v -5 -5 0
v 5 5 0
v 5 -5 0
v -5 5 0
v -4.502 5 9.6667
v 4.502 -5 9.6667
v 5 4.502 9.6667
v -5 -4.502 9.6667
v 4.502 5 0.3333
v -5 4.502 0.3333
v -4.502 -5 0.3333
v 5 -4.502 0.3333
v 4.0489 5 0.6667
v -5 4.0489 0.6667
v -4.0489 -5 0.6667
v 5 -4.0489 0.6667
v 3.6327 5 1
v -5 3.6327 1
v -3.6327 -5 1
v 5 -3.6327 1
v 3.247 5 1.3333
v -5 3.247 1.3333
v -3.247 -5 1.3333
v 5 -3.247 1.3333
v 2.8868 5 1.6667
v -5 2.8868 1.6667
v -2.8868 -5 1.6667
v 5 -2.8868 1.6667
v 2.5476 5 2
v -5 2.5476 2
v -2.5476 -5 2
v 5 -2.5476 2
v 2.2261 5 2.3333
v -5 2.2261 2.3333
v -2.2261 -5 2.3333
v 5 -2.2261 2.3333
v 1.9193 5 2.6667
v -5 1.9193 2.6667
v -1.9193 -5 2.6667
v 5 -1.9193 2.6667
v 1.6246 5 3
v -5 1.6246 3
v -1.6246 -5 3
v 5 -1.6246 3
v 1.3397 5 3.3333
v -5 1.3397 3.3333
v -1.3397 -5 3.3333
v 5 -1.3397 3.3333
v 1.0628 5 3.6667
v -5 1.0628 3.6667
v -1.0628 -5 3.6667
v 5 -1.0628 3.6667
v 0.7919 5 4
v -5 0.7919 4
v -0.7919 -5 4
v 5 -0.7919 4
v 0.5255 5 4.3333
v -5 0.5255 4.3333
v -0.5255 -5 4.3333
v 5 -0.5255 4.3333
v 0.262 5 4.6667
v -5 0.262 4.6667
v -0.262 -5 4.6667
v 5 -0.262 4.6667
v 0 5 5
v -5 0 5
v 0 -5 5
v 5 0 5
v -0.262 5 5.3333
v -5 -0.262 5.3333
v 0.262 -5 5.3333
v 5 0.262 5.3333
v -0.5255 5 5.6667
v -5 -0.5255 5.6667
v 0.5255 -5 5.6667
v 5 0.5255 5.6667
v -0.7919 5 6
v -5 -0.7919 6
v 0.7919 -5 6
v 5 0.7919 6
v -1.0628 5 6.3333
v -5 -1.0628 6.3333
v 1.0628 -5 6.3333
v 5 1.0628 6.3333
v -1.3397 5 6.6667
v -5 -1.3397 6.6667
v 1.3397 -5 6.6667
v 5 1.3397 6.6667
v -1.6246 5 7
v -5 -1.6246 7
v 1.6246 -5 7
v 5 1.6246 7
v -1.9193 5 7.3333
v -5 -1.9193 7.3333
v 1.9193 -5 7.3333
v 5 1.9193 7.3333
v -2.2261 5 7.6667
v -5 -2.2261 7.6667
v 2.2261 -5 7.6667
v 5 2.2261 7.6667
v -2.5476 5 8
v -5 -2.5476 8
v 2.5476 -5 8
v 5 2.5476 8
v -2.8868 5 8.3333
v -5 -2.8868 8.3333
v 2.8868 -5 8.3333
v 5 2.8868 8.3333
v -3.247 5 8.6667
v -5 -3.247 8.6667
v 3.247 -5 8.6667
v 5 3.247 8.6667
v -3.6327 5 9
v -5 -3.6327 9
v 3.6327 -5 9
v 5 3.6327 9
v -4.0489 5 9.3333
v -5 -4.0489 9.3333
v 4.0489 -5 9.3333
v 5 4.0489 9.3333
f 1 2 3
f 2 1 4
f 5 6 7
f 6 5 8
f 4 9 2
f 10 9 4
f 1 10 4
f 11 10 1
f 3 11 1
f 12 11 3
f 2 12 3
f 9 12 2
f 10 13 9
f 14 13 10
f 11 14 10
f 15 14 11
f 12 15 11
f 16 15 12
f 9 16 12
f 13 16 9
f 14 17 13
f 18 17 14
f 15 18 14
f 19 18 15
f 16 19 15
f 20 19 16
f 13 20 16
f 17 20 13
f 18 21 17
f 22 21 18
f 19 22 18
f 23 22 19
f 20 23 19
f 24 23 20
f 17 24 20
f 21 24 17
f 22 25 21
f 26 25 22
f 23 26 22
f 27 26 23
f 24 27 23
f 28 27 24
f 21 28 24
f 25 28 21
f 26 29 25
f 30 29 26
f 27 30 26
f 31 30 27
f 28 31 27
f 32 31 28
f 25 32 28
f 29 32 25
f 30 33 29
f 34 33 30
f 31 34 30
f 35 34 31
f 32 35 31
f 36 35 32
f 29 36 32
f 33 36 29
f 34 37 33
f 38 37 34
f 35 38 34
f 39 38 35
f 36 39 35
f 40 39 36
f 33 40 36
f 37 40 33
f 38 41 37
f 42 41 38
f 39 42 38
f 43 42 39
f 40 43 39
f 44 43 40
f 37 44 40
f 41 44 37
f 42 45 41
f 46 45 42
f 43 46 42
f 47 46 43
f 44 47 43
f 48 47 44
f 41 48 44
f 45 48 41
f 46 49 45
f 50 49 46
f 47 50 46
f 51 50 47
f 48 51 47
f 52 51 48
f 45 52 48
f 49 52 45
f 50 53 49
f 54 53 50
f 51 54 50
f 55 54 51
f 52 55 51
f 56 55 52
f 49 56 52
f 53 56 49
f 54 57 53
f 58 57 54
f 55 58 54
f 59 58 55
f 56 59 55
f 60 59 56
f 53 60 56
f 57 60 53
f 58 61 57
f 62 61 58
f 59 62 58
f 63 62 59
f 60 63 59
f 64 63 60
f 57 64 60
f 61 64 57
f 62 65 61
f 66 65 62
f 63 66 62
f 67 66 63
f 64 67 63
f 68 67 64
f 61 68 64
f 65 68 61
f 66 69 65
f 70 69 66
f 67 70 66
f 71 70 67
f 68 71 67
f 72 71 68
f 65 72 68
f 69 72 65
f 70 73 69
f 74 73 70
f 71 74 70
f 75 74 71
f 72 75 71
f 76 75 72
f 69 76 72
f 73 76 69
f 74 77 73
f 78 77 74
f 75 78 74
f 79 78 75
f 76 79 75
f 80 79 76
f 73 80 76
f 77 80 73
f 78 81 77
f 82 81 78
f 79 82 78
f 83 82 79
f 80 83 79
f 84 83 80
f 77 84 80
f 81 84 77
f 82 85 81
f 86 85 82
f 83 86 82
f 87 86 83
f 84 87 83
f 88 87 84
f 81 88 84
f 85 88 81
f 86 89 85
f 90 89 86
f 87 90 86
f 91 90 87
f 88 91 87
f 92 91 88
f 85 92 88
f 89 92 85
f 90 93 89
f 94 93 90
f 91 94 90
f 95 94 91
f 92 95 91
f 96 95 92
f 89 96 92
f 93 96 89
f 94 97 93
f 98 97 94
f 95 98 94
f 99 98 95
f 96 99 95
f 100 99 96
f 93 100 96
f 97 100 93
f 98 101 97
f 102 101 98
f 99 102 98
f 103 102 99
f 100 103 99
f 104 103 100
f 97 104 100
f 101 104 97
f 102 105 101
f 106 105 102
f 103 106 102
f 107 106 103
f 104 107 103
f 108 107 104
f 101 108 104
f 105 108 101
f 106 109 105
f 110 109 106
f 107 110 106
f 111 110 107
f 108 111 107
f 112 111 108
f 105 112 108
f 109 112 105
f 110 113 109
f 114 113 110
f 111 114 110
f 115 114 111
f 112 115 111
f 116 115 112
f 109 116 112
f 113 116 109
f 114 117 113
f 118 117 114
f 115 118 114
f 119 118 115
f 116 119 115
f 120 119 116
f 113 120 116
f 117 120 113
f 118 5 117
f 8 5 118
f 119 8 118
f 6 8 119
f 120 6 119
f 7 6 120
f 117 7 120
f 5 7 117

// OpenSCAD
// file: quickthread.scad
function _numSections(numTurns) = 1+numTurns*$fn;

extrusionNudge = 0.001;

function threadPoints(section,radius,numTurns,lead) =
    let (n=len(section),
        m=_numSections(numTurns)
        ) 
        [ for (i=[0:m-1]) for (j=[0:n-1]) 
            let (z=i/$fn*lead,
                angle=(i%$fn)/$fn*360,
                v=section[j])
            [ (radius+v[0])*cos(angle), (radius+v[0])*sin(angle),z+v[1]] ];
        
function mod(m,n) = let(mm = m%n) mm<0 ? n+mm : mm;
        
function extrusionPointIndex(pointsPerSection,sectionNumber,pointInSection) = pointsPerSection*sectionNumber + mod(pointInSection,pointsPerSection);
        
function _extrusionStartFace(pointsPerSection) = 
    [for (i=[0:pointsPerSection-1]) extrusionPointIndex(pointsPerSection,0,i)];
            
function _extrusionEndFace(pointsPerSection, numSections) = 
    [for (i=[pointsPerSection-1:-1:0]) extrusionPointIndex(pointsPerSection,numSections-1,i)];
                
function extrusionTubeFaces(pointsPerSection, numSections) =
            [for (i=[0:numSections-2]) for (j=[0:pointsPerSection-1]) for(tri=[0:1])
                tri==0 ? 
                    [extrusionPointIndex(pointsPerSection,i,j),extrusionPointIndex(pointsPerSection,i+1,j),extrusionPointIndex(pointsPerSection,i,j+1)] :
                    [extrusionPointIndex(pointsPerSection,i,j+1), extrusionPointIndex(pointsPerSection,i+1,j),
            extrusionPointIndex(pointsPerSection,i+1,j+1)]];
                
function extrusionFaces(pointsPerSection, numSections) = concat([_extrusionStartFace(pointsPerSection),_extrusionEndFace(pointsPerSection,numSections)],extrusionTubeFaces(pointsPerSection, numSections));

                    
module rawThread(profile, d=undef, h=10, lead=undef, $fn=72, adjustRadius=false, clip=true, includeCylinder=true) {
    radius = d/2;
    vSize = max([for(v1=profile) for(v2=profile) v2[1]-v1[1]]);
    vMin = min([for(v=profile) v[0]]);
    radiusAdjustment = adjustRadius ? vMin : 0;
    _lead = lead==undef ? vSize : lead;
    profileScale = vSize <= _lead-extrusionNudge ? 1 : (_lead-extrusionNudge)/vSize;
    adjProfile = [for(v=profile) [v[0]-radiusAdjustment,v[1]*profileScale]];
    adjRadius = radius + radiusAdjustment;
    hSize = 1+2*adjRadius + 2*max([for (v=adjProfile) v[0]]);
    numTurns = 2+ceil(h/_lead);
    render(convexity=10)
    union() {
        intersection() {
            if (clip)
                translate([-hSize/2,-hSize/2,0]) cube([hSize,hSize,h]);
            translate([0,0,-_lead]) polyhedron(faces=extrusionFaces(len(adjProfile), _numSections(numTurns)), points=threadPoints(
            adjProfile,adjRadius,numTurns,_lead));
        }
        if (includeCylinder) 
            cylinder(r=adjRadius+extrusionNudge,$fn=$fn,h=h);
    }
}

function inch_to_mm(x) = x * 25.4;

// internal = female
module isoThread(d=undef, dInch=undef, pitch=1, tpi=undef, h=1, hInch=undef, lead=undef, leadInch=undef, angle=30, internal=false, starts=1, $fn=72) {

    P = (tpi==undef) ? pitch : inch_to_mm(1/tpi);

    radius = dInch != undef ? inch_to_mm(dInch)/2 : d/2;    
    height = hInch != undef ? inch_to_mm(hInch) : h;
     
    Dmaj = 2*radius;
    H = P * cos(angle);
    
    _lead = leadInch != undef ? inch_to_mm(leadInch) : lead != undef ? lead : P;
    
    externalExtra=0.03;
    internalExtra=0.057;
    profile = !internal ? 
        [ [-H*externalExtra,(-3/8-externalExtra)*P], 
          [(5/8)*H,-P/16],[(5/8)*H,P/16], 
          [-H*externalExtra,(3/8+externalExtra)*pitch] ] :
        [ [0,-(3/8)*P], 
        [(5/8)*H,-P/16],[(5/8+internalExtra)*H,0],
        [(5/8)*H,P/16],[0,(3/8)*P] ];
    Dmin = Dmaj-2*H/4;
    myFN=$fn;
    for (i=[0:starts-1]) {
        rotate([0,0,360/starts*i]) rawThread(profile,d=Dmin,h=height,lead=_lead,$fn=myFN,adjustRadius=true);        
    }
}

//rawThread([[0,0],[1.5,1.5],[0,3]], d=50, h=91, pitch=3);
//rawThread([[0,0],[0,3],[3,3],[3,0]], d=50, h=50, pitch=6, $fn=80);
render(convexity=5)
difference() {
    isoThread(d=50,h=30,pitch=3,angle=40,internal=false,$fn=60);
    translate([0,0,-extrusionNudge]) isoThread(d=42,h=30+2*extrusionNudge,pitch=3,angle=40,internal=true,$fn=60);
}
//rawThread([[0,0],[1,0],[.5,.5],[1,1],[0,1]],r=20,h=10,lead=1.5);
// main file
use <quickthread.scad>;

numSlices = 30;
points = [for (i=[0:numSlices]) 
        let(t=i/numSlices, 
            angle=45+90*t,
            r=5/sin(angle)
            )
        for (j=[0:3])
            [r*cos(angle+j*90),r*sin(angle+j*90),10*t]];
polyhedron(faces=extrusionFaces(4,numSlices),points=points);
